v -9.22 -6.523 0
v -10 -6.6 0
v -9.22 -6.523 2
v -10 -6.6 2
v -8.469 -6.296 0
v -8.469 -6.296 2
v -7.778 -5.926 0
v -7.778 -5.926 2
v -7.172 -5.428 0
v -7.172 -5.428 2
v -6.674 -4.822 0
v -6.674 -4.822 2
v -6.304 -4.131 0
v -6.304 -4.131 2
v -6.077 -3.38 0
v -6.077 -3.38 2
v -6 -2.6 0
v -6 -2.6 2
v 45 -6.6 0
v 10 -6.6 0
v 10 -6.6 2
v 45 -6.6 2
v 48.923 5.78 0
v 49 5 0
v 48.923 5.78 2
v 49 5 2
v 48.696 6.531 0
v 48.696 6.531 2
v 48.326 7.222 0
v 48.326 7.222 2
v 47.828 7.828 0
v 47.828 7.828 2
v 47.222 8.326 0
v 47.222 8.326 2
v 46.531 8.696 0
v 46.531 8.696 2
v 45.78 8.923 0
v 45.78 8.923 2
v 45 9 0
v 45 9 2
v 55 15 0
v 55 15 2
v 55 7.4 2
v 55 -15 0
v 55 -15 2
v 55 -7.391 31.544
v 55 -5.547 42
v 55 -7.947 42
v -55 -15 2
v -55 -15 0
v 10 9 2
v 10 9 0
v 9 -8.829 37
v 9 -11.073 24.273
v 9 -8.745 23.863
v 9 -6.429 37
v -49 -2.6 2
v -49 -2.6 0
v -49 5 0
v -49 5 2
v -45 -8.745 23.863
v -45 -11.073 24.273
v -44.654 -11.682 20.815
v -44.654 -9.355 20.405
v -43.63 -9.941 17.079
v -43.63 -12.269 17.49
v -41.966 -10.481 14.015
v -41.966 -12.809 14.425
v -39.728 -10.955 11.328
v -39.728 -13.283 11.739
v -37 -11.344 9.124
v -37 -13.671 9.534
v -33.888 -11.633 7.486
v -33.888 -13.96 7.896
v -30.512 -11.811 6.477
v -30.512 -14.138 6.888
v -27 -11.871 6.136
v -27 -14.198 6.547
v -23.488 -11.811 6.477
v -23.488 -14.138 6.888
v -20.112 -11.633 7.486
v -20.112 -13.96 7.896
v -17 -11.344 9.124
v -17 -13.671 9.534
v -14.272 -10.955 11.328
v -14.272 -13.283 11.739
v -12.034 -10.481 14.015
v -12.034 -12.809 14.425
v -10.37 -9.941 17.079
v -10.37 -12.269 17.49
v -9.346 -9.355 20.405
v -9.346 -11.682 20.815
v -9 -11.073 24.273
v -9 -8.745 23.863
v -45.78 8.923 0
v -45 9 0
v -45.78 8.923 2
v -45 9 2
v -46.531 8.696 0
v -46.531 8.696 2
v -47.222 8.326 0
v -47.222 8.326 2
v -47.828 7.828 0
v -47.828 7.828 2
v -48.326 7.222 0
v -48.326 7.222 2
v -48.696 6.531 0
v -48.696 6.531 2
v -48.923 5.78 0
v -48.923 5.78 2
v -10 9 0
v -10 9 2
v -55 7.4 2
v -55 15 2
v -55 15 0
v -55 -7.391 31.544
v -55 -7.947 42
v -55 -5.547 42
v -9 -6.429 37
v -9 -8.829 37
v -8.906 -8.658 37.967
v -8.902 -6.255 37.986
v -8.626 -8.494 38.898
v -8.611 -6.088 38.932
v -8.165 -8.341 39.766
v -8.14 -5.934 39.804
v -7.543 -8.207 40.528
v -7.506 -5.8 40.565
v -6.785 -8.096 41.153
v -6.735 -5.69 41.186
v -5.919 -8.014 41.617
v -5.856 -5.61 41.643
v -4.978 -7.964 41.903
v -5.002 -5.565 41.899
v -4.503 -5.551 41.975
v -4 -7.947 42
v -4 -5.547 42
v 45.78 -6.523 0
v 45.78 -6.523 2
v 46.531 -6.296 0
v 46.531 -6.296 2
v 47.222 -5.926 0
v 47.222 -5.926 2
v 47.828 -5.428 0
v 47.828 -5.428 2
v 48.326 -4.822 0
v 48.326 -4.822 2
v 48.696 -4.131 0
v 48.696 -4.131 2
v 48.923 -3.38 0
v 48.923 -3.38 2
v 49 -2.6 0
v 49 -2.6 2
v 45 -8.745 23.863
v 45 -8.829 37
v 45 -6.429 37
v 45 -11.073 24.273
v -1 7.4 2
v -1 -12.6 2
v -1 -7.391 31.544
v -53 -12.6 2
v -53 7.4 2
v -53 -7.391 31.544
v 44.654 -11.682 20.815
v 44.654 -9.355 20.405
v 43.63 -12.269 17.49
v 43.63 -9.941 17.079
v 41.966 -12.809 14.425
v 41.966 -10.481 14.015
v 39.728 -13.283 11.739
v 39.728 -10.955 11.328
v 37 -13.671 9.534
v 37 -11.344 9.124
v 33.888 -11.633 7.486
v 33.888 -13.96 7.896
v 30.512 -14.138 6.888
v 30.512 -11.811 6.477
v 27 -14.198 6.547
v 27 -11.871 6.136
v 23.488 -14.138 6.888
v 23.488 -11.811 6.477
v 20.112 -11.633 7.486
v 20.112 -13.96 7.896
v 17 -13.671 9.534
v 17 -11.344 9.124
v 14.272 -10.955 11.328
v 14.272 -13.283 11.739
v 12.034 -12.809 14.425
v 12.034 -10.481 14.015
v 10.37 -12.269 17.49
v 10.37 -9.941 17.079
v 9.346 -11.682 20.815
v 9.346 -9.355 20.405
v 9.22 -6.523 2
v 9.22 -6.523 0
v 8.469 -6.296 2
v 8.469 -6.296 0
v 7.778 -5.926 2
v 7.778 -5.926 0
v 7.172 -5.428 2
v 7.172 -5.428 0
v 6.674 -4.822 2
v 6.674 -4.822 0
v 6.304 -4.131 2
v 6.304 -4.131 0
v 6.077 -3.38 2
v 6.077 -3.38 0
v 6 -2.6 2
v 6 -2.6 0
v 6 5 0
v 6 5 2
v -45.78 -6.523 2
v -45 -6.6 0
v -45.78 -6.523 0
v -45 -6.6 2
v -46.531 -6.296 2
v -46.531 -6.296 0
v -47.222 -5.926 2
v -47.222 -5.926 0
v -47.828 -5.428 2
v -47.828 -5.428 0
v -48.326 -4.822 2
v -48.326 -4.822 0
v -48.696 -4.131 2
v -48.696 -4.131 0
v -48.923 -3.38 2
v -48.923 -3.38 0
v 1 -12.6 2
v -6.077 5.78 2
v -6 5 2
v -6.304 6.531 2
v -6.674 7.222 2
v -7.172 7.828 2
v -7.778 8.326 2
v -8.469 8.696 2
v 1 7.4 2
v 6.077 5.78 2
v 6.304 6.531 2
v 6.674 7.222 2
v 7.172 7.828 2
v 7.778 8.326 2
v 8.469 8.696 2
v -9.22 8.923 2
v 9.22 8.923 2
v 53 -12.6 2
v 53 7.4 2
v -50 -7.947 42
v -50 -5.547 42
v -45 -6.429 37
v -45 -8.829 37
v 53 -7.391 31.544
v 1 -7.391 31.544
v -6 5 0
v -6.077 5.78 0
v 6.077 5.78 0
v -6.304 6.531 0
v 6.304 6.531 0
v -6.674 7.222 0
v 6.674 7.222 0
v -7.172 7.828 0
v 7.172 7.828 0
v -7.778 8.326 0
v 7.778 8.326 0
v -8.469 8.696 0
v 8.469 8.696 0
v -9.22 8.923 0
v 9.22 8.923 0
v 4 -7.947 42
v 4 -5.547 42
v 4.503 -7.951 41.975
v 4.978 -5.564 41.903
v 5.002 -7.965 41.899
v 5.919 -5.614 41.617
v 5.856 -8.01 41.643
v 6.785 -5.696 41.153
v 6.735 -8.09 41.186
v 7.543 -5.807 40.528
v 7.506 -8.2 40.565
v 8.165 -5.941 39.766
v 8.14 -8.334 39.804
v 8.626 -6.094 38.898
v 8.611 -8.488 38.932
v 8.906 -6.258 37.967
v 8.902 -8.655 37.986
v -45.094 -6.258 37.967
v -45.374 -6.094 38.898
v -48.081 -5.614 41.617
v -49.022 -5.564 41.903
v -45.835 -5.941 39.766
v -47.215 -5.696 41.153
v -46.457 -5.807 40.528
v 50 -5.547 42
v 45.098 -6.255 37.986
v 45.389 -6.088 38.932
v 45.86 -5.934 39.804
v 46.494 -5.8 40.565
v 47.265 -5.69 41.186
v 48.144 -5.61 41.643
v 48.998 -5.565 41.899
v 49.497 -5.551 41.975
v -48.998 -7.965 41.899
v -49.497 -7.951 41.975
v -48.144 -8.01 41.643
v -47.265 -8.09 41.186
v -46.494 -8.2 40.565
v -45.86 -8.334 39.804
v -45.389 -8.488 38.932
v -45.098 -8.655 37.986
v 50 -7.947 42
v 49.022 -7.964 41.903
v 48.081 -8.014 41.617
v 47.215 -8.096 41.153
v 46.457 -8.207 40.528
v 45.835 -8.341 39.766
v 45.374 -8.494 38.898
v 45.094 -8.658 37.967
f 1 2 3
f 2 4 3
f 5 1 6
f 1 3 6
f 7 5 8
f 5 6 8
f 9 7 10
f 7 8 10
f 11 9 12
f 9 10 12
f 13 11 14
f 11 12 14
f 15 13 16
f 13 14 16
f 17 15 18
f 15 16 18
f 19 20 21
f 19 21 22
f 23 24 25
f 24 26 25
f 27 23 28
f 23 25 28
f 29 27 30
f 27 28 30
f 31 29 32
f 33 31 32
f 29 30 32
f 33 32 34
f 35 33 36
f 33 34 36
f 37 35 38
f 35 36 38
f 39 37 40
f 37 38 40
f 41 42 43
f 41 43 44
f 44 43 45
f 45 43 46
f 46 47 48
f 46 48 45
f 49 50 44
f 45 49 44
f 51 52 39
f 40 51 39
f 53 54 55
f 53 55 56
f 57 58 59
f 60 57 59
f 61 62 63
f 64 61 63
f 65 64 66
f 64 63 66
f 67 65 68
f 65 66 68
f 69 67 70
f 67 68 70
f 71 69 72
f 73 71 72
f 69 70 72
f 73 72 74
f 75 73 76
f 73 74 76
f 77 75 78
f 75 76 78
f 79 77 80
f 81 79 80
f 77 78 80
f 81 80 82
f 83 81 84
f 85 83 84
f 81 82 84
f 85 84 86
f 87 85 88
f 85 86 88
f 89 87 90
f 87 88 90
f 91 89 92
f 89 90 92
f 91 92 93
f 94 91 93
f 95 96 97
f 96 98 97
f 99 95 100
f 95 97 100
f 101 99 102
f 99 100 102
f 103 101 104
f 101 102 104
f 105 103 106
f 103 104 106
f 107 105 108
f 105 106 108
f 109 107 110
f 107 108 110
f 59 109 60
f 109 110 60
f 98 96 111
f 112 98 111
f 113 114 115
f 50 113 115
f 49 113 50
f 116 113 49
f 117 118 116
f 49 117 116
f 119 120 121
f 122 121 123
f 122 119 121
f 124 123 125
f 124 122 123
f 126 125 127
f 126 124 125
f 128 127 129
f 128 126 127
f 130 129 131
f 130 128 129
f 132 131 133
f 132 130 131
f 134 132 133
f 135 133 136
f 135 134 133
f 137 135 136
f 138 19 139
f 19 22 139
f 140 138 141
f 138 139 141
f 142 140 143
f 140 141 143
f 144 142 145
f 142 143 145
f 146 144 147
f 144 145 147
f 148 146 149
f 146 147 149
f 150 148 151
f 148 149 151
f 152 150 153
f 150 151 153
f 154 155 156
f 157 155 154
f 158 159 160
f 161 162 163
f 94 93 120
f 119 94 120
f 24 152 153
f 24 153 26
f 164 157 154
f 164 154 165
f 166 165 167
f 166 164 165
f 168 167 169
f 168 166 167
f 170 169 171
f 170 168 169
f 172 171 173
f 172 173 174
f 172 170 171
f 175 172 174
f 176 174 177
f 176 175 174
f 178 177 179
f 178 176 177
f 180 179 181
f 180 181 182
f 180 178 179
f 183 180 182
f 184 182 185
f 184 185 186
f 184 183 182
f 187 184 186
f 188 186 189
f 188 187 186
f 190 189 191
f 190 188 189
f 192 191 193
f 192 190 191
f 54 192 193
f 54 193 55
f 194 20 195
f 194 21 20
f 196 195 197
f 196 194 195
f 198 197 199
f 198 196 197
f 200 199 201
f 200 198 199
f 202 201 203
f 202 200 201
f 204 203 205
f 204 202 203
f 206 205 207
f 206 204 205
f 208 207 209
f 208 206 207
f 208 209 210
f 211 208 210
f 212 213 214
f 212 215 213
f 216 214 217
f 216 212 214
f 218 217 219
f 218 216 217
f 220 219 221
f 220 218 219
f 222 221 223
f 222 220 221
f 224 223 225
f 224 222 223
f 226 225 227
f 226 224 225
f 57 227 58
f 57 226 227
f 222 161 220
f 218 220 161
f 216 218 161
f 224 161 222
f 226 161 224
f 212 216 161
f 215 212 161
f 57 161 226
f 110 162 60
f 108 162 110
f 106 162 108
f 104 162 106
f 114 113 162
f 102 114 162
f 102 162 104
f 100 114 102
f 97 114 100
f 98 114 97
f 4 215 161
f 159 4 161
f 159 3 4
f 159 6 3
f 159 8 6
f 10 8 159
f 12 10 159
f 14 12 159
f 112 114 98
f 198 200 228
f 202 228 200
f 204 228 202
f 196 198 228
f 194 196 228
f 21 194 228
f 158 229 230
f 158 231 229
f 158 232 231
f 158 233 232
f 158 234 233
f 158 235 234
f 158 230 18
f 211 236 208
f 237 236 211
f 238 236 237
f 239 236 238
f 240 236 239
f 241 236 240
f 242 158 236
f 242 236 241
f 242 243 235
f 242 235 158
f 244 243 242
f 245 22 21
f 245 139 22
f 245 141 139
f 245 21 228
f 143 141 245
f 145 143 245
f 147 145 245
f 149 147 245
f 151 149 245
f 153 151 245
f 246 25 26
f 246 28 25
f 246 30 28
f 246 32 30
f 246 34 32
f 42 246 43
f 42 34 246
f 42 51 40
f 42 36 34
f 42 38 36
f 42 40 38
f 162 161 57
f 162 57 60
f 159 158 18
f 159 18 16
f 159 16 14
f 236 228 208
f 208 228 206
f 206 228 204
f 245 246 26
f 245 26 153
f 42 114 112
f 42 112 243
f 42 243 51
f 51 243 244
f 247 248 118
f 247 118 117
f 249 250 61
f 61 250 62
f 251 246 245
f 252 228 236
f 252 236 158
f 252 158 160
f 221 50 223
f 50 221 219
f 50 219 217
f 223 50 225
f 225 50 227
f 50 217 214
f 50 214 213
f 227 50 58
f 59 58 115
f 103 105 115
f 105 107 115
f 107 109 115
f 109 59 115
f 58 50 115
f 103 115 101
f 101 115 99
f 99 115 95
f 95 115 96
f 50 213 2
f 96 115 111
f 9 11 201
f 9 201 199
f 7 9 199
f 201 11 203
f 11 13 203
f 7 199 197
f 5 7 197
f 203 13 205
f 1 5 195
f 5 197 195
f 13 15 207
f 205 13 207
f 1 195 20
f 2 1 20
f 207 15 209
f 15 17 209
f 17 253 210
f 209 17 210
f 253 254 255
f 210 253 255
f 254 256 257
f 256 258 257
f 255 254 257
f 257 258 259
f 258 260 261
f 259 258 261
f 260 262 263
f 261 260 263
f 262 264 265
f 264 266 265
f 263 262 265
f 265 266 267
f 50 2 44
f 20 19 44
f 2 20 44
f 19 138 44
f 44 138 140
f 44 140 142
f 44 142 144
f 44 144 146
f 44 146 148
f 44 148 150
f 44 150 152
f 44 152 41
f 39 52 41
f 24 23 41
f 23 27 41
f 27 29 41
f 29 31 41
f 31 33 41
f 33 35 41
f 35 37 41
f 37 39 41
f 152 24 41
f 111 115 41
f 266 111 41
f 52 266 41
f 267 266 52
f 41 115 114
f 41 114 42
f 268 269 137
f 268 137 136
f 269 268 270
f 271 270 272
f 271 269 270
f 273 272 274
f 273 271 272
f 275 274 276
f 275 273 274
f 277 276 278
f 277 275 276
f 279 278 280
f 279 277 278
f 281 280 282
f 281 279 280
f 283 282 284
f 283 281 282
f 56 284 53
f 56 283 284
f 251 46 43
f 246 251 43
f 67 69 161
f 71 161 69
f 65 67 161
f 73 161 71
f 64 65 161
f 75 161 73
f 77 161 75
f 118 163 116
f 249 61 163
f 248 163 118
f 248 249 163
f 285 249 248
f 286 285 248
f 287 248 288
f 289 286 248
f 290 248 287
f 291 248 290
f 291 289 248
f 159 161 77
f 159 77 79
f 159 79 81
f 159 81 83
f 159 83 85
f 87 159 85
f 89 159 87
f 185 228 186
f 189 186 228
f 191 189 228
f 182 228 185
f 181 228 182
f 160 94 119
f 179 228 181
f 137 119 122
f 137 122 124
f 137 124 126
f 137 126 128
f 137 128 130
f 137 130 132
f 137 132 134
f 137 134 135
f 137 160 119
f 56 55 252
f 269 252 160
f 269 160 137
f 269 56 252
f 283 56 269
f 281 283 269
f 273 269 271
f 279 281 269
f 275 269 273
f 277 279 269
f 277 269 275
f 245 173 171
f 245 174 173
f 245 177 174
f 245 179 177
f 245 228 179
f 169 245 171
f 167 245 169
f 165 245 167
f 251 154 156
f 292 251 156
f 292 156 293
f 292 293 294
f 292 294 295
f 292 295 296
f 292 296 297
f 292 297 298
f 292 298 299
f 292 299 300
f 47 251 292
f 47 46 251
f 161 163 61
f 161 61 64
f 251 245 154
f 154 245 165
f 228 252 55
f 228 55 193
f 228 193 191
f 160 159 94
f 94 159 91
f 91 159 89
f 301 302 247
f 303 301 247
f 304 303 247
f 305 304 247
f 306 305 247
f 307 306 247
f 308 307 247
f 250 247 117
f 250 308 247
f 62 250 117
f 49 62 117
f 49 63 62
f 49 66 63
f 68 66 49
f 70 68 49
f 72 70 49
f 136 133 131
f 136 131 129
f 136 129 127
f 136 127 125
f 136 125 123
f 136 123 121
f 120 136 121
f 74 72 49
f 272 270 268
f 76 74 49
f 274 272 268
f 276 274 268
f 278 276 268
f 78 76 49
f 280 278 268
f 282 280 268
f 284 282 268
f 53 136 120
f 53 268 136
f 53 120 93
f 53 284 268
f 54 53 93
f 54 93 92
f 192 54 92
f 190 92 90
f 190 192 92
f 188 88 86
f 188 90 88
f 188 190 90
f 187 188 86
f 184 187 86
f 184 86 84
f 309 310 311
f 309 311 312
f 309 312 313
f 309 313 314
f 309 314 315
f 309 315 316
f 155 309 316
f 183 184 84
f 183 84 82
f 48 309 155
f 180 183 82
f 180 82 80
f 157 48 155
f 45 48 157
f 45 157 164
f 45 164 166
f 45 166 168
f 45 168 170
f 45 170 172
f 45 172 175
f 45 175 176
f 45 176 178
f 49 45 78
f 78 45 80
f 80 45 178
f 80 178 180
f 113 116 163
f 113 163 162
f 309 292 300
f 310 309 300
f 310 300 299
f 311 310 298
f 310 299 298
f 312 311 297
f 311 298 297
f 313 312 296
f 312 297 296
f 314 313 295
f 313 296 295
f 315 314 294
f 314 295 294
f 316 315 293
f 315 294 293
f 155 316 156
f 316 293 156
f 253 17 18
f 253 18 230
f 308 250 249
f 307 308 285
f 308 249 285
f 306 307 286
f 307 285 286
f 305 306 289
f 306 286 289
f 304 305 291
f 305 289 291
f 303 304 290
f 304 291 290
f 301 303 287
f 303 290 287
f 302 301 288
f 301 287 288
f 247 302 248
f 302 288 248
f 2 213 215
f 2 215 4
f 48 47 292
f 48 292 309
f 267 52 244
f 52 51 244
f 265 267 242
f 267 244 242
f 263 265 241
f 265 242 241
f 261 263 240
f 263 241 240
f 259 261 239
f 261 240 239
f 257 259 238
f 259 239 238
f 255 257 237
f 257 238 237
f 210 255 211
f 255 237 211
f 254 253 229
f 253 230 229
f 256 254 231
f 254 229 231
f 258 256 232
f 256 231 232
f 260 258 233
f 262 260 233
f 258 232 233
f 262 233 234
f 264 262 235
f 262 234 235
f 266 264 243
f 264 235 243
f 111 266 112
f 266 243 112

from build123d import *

# Parameters (mm, degrees)
F0_W         = 110
F0_H         = 30
F1_DEPTH     = 2
F3_DEPTH     = 55
F5_DEPTH     = 2.3635386072
F7_DEPTH     = 2
F9_DEPTH     = 1
F10_W        = 43
F10_H        = 15.6
F11_DEPTH    = 2
F12_T1_DEPTH = 27.4
F13_R        = 4


# Not quite as in the source:
# - a fillet or chamfer that OpenCascade refuses, or shapes differently, is made with other operations: its cross-section is extruded or revolved along the edge and cut away or added
# - a pattern or mirror of a feature is missing from the dataset's text; its kind, count and spacing are read off the source's solid


with BuildPart() as f1:
    # F0 (on Top) → F1 (new body)
    with BuildSketch(Plane.XY):
        Rectangle(F0_W, F0_H)
    extrude(amount=F1_DEPTH)

    # F2 (on Right) → F3 (join, symmetric)
    with BuildSketch(Plane.YZ):
        Polygon((-15, 2), (-12.6, 2), (-5.5469207717, 42), (-7.9469207717, 42), align=None)
    extrude(amount=F3_DEPTH, both=True)

    # F4 (on face) → F5 (cut, through all)
    with BuildSketch(Plane(origin=(0, -14.8897147992, 2.6254584542), x_dir=(1, 0, 0), z_dir=(0, -0.984807753, 0.1736481777))):
        with BuildLine():
            Line((-9, 21.9819573165), (-9, 39.9819573165))
            Line((-9, 39.9819573165), (-9, 44.9819573165))
            Line((-9, 44.9819573165), (-45, 44.9819573165))
            Line((-45, 44.9819573165), (-45, 39.9819573165))
            Line((-45, 39.9819573165), (-45, 21.9819573165))
            ThreePointArc((-45, 21.9819573165), (-27, 3.9819573165), (-9, 21.9819573165))
        make_face()
    f5 = extrude(amount=-F5_DEPTH, mode=Mode.SUBTRACT)

    # F5_copies: F5 across plane
    add(f5.mirror(Plane(origin=(0, 0, 0), x_dir=(0, 0, 1), z_dir=(1, 0, 0))), mode=Mode.SUBTRACT)

    # F6 (on face) → F7 (join)
    with BuildSketch(Plane(origin=(-55, 0, 0), x_dir=(0, -1, 0), z_dir=(-1, 0, 0))):
        Polygon((7.39055467, 31.5442325904), (-7.4, 2), (12.6, 2), align=None)
    f7 = extrude(amount=-F7_DEPTH)

    # F7_copies: F7 across plane
    add(f7.mirror(Plane(origin=(0, 0, 0), x_dir=(0, 0, 1), z_dir=(1, 0, 0))))

    # F8 (on Right) → F9 (join, symmetric)
    with BuildSketch(Plane.YZ):
        Polygon((-12.6, 2), (7.4, 2), (-7.39055467, 31.5442325904), align=None)
    extrude(amount=F9_DEPTH, both=True)

    # F10 (on Top) → F11 (cut, through all)
    with BuildSketch(Plane.XY):
        with Locations((27.5, 1.2)):
            Rectangle(F10_W, F10_H)
        with Locations((-27.5, 1.2)):
            Rectangle(F10_W, F10_H)
    extrude(amount=F11_DEPTH, mode=Mode.SUBTRACT)

    # F12: fillet of radius 5 on 6 edges, made by hand

    # F12_s2 → F12_t1 (cut)
    with BuildSketch(Plane.XZ.offset(-6.9530792283)):
        with BuildLine():
            ThreePointArc((50, 42), (46.4644660941, 40.5355339059), (45, 37))
            Line((45, 37), (45, 42))
            Line((45, 42), (50, 42))
        make_face()
        with BuildLine():
            ThreePointArc((-45, 37), (-46.4644660941, 40.5355339059), (-50, 42))
            Line((-50, 42), (-45, 42))
            Line((-45, 42), (-45, 37))
        make_face()
        with BuildLine():
            ThreePointArc((-9, 37), (-7.5355339059, 40.5355339059), (-4, 42))
            Line((-4, 42), (-9, 42))
            Line((-9, 42), (-9, 37))
        make_face()
        with BuildLine():
            ThreePointArc((4, 42), (7.5355339059, 40.5355339059), (9, 37))
            Line((9, 37), (9, 42))
            Line((9, 42), (4, 42))
        make_face()
    extrude(amount=F12_T1_DEPTH, mode=Mode.SUBTRACT)

    # F13
    f13_edges = [f1.edges().sort_by_distance(p)[0] for p in [
        (-49, -6.6, 1),
        (49, -6.6, 1),
        (-6, -6.6, 1),
        (6, -6.6, 1),
        (6, 9, 1),
        (-49, 9, 1),
        (49, 9, 1),
        (-6, 9, 1),
    ]]
    fillet(f13_edges, radius=F13_R)


solid = f1.part
